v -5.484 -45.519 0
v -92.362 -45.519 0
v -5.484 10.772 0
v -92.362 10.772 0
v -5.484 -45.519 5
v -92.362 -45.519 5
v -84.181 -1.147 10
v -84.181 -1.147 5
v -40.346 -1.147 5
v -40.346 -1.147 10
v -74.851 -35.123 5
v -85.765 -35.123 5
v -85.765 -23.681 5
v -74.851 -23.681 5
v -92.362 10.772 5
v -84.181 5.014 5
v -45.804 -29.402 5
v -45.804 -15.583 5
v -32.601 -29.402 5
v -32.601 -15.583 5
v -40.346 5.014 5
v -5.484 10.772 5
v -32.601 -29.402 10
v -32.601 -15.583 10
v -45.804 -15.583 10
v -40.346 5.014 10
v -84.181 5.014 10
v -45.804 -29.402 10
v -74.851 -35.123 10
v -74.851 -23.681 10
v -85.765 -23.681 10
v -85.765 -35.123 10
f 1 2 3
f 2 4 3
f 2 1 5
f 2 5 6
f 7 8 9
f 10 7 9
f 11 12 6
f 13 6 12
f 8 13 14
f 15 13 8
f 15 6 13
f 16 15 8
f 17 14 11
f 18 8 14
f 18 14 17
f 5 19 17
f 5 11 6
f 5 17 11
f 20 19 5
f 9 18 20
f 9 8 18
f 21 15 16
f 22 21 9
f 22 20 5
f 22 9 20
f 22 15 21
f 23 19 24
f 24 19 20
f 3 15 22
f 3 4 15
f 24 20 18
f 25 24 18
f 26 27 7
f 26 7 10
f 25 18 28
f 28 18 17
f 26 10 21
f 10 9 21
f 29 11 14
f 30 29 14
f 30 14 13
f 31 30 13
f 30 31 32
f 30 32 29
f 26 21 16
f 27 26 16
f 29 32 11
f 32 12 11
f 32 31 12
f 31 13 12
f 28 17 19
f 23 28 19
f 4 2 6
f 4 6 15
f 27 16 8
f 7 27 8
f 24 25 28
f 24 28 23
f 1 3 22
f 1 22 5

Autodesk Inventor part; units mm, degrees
ref_plane "YZ Plane" through (0, 0, 0) normal (1, 0, 0) x (0, 1, 0)
ref_plane "XZ Plane" through (0, 0, 0) normal (0, 1, 0) x (-1, 0, 0)
ref_plane "XY Plane" through (0, 0, 0) normal (0, 0, 1) x (1, 0, 0)
sketch "Sketch1" plane through (0, 0, 0) normal (0, 0, 1) x (1, 0, 0)
  line L0 (-5.4839, -45.5191) -> (-92.3615, -45.5191)
  line L1 (-92.3615, -45.5191) -> (-92.3615, 10.7724)
  line L2 (-92.3615, 10.7724) -> (-5.4839, 10.7724)
  line L3 (-5.4839, 10.7724) -> (-5.4839, -45.5191)
  point P0 (0, 0)
extrude "Extrusion1" add sketch "Sketch1" along normal blind 5
sketch "Sketch2" plane through (0, 0, 5) normal (0, 0, 1) x (1, 0, 0)
  point P0 (0, 0)
sketch "Sketch3" plane through (0, 0, 5) normal (0, 0, 1) x (1, 0, 0)
  line L0 (-40.3465, 5.0142) -> (-84.1809, 5.0142)
  line L1 (-84.1809, 5.0142) -> (-84.1809, -1.1473)
  line L2 (-84.1809, -1.1473) -> (-40.3465, -1.1473)
  line L3 (-40.3465, -1.1473) -> (-40.3465, 5.0142)
  line L4 (-74.8507, -23.6806) -> (-85.7653, -23.6806)
  line L5 (-85.7653, -23.6806) -> (-85.7653, -35.1234)
  line L6 (-85.7653, -35.1234) -> (-74.8507, -35.1234)
  line L7 (-74.8507, -35.1234) -> (-74.8507, -23.6806)
  line L8 (-32.6006, -15.5827) -> (-45.8038, -15.5827)
  line L9 (-45.8038, -15.5827) -> (-45.8038, -29.402)
  line L10 (-45.8038, -29.402) -> (-32.6006, -29.402)
  line L11 (-32.6006, -29.402) -> (-32.6006, -15.5827)
  point P0 (0, 0)
extrude "Extrusion2" add sketch "Sketch3" along normal blind 5
properties part number "raspberry"
